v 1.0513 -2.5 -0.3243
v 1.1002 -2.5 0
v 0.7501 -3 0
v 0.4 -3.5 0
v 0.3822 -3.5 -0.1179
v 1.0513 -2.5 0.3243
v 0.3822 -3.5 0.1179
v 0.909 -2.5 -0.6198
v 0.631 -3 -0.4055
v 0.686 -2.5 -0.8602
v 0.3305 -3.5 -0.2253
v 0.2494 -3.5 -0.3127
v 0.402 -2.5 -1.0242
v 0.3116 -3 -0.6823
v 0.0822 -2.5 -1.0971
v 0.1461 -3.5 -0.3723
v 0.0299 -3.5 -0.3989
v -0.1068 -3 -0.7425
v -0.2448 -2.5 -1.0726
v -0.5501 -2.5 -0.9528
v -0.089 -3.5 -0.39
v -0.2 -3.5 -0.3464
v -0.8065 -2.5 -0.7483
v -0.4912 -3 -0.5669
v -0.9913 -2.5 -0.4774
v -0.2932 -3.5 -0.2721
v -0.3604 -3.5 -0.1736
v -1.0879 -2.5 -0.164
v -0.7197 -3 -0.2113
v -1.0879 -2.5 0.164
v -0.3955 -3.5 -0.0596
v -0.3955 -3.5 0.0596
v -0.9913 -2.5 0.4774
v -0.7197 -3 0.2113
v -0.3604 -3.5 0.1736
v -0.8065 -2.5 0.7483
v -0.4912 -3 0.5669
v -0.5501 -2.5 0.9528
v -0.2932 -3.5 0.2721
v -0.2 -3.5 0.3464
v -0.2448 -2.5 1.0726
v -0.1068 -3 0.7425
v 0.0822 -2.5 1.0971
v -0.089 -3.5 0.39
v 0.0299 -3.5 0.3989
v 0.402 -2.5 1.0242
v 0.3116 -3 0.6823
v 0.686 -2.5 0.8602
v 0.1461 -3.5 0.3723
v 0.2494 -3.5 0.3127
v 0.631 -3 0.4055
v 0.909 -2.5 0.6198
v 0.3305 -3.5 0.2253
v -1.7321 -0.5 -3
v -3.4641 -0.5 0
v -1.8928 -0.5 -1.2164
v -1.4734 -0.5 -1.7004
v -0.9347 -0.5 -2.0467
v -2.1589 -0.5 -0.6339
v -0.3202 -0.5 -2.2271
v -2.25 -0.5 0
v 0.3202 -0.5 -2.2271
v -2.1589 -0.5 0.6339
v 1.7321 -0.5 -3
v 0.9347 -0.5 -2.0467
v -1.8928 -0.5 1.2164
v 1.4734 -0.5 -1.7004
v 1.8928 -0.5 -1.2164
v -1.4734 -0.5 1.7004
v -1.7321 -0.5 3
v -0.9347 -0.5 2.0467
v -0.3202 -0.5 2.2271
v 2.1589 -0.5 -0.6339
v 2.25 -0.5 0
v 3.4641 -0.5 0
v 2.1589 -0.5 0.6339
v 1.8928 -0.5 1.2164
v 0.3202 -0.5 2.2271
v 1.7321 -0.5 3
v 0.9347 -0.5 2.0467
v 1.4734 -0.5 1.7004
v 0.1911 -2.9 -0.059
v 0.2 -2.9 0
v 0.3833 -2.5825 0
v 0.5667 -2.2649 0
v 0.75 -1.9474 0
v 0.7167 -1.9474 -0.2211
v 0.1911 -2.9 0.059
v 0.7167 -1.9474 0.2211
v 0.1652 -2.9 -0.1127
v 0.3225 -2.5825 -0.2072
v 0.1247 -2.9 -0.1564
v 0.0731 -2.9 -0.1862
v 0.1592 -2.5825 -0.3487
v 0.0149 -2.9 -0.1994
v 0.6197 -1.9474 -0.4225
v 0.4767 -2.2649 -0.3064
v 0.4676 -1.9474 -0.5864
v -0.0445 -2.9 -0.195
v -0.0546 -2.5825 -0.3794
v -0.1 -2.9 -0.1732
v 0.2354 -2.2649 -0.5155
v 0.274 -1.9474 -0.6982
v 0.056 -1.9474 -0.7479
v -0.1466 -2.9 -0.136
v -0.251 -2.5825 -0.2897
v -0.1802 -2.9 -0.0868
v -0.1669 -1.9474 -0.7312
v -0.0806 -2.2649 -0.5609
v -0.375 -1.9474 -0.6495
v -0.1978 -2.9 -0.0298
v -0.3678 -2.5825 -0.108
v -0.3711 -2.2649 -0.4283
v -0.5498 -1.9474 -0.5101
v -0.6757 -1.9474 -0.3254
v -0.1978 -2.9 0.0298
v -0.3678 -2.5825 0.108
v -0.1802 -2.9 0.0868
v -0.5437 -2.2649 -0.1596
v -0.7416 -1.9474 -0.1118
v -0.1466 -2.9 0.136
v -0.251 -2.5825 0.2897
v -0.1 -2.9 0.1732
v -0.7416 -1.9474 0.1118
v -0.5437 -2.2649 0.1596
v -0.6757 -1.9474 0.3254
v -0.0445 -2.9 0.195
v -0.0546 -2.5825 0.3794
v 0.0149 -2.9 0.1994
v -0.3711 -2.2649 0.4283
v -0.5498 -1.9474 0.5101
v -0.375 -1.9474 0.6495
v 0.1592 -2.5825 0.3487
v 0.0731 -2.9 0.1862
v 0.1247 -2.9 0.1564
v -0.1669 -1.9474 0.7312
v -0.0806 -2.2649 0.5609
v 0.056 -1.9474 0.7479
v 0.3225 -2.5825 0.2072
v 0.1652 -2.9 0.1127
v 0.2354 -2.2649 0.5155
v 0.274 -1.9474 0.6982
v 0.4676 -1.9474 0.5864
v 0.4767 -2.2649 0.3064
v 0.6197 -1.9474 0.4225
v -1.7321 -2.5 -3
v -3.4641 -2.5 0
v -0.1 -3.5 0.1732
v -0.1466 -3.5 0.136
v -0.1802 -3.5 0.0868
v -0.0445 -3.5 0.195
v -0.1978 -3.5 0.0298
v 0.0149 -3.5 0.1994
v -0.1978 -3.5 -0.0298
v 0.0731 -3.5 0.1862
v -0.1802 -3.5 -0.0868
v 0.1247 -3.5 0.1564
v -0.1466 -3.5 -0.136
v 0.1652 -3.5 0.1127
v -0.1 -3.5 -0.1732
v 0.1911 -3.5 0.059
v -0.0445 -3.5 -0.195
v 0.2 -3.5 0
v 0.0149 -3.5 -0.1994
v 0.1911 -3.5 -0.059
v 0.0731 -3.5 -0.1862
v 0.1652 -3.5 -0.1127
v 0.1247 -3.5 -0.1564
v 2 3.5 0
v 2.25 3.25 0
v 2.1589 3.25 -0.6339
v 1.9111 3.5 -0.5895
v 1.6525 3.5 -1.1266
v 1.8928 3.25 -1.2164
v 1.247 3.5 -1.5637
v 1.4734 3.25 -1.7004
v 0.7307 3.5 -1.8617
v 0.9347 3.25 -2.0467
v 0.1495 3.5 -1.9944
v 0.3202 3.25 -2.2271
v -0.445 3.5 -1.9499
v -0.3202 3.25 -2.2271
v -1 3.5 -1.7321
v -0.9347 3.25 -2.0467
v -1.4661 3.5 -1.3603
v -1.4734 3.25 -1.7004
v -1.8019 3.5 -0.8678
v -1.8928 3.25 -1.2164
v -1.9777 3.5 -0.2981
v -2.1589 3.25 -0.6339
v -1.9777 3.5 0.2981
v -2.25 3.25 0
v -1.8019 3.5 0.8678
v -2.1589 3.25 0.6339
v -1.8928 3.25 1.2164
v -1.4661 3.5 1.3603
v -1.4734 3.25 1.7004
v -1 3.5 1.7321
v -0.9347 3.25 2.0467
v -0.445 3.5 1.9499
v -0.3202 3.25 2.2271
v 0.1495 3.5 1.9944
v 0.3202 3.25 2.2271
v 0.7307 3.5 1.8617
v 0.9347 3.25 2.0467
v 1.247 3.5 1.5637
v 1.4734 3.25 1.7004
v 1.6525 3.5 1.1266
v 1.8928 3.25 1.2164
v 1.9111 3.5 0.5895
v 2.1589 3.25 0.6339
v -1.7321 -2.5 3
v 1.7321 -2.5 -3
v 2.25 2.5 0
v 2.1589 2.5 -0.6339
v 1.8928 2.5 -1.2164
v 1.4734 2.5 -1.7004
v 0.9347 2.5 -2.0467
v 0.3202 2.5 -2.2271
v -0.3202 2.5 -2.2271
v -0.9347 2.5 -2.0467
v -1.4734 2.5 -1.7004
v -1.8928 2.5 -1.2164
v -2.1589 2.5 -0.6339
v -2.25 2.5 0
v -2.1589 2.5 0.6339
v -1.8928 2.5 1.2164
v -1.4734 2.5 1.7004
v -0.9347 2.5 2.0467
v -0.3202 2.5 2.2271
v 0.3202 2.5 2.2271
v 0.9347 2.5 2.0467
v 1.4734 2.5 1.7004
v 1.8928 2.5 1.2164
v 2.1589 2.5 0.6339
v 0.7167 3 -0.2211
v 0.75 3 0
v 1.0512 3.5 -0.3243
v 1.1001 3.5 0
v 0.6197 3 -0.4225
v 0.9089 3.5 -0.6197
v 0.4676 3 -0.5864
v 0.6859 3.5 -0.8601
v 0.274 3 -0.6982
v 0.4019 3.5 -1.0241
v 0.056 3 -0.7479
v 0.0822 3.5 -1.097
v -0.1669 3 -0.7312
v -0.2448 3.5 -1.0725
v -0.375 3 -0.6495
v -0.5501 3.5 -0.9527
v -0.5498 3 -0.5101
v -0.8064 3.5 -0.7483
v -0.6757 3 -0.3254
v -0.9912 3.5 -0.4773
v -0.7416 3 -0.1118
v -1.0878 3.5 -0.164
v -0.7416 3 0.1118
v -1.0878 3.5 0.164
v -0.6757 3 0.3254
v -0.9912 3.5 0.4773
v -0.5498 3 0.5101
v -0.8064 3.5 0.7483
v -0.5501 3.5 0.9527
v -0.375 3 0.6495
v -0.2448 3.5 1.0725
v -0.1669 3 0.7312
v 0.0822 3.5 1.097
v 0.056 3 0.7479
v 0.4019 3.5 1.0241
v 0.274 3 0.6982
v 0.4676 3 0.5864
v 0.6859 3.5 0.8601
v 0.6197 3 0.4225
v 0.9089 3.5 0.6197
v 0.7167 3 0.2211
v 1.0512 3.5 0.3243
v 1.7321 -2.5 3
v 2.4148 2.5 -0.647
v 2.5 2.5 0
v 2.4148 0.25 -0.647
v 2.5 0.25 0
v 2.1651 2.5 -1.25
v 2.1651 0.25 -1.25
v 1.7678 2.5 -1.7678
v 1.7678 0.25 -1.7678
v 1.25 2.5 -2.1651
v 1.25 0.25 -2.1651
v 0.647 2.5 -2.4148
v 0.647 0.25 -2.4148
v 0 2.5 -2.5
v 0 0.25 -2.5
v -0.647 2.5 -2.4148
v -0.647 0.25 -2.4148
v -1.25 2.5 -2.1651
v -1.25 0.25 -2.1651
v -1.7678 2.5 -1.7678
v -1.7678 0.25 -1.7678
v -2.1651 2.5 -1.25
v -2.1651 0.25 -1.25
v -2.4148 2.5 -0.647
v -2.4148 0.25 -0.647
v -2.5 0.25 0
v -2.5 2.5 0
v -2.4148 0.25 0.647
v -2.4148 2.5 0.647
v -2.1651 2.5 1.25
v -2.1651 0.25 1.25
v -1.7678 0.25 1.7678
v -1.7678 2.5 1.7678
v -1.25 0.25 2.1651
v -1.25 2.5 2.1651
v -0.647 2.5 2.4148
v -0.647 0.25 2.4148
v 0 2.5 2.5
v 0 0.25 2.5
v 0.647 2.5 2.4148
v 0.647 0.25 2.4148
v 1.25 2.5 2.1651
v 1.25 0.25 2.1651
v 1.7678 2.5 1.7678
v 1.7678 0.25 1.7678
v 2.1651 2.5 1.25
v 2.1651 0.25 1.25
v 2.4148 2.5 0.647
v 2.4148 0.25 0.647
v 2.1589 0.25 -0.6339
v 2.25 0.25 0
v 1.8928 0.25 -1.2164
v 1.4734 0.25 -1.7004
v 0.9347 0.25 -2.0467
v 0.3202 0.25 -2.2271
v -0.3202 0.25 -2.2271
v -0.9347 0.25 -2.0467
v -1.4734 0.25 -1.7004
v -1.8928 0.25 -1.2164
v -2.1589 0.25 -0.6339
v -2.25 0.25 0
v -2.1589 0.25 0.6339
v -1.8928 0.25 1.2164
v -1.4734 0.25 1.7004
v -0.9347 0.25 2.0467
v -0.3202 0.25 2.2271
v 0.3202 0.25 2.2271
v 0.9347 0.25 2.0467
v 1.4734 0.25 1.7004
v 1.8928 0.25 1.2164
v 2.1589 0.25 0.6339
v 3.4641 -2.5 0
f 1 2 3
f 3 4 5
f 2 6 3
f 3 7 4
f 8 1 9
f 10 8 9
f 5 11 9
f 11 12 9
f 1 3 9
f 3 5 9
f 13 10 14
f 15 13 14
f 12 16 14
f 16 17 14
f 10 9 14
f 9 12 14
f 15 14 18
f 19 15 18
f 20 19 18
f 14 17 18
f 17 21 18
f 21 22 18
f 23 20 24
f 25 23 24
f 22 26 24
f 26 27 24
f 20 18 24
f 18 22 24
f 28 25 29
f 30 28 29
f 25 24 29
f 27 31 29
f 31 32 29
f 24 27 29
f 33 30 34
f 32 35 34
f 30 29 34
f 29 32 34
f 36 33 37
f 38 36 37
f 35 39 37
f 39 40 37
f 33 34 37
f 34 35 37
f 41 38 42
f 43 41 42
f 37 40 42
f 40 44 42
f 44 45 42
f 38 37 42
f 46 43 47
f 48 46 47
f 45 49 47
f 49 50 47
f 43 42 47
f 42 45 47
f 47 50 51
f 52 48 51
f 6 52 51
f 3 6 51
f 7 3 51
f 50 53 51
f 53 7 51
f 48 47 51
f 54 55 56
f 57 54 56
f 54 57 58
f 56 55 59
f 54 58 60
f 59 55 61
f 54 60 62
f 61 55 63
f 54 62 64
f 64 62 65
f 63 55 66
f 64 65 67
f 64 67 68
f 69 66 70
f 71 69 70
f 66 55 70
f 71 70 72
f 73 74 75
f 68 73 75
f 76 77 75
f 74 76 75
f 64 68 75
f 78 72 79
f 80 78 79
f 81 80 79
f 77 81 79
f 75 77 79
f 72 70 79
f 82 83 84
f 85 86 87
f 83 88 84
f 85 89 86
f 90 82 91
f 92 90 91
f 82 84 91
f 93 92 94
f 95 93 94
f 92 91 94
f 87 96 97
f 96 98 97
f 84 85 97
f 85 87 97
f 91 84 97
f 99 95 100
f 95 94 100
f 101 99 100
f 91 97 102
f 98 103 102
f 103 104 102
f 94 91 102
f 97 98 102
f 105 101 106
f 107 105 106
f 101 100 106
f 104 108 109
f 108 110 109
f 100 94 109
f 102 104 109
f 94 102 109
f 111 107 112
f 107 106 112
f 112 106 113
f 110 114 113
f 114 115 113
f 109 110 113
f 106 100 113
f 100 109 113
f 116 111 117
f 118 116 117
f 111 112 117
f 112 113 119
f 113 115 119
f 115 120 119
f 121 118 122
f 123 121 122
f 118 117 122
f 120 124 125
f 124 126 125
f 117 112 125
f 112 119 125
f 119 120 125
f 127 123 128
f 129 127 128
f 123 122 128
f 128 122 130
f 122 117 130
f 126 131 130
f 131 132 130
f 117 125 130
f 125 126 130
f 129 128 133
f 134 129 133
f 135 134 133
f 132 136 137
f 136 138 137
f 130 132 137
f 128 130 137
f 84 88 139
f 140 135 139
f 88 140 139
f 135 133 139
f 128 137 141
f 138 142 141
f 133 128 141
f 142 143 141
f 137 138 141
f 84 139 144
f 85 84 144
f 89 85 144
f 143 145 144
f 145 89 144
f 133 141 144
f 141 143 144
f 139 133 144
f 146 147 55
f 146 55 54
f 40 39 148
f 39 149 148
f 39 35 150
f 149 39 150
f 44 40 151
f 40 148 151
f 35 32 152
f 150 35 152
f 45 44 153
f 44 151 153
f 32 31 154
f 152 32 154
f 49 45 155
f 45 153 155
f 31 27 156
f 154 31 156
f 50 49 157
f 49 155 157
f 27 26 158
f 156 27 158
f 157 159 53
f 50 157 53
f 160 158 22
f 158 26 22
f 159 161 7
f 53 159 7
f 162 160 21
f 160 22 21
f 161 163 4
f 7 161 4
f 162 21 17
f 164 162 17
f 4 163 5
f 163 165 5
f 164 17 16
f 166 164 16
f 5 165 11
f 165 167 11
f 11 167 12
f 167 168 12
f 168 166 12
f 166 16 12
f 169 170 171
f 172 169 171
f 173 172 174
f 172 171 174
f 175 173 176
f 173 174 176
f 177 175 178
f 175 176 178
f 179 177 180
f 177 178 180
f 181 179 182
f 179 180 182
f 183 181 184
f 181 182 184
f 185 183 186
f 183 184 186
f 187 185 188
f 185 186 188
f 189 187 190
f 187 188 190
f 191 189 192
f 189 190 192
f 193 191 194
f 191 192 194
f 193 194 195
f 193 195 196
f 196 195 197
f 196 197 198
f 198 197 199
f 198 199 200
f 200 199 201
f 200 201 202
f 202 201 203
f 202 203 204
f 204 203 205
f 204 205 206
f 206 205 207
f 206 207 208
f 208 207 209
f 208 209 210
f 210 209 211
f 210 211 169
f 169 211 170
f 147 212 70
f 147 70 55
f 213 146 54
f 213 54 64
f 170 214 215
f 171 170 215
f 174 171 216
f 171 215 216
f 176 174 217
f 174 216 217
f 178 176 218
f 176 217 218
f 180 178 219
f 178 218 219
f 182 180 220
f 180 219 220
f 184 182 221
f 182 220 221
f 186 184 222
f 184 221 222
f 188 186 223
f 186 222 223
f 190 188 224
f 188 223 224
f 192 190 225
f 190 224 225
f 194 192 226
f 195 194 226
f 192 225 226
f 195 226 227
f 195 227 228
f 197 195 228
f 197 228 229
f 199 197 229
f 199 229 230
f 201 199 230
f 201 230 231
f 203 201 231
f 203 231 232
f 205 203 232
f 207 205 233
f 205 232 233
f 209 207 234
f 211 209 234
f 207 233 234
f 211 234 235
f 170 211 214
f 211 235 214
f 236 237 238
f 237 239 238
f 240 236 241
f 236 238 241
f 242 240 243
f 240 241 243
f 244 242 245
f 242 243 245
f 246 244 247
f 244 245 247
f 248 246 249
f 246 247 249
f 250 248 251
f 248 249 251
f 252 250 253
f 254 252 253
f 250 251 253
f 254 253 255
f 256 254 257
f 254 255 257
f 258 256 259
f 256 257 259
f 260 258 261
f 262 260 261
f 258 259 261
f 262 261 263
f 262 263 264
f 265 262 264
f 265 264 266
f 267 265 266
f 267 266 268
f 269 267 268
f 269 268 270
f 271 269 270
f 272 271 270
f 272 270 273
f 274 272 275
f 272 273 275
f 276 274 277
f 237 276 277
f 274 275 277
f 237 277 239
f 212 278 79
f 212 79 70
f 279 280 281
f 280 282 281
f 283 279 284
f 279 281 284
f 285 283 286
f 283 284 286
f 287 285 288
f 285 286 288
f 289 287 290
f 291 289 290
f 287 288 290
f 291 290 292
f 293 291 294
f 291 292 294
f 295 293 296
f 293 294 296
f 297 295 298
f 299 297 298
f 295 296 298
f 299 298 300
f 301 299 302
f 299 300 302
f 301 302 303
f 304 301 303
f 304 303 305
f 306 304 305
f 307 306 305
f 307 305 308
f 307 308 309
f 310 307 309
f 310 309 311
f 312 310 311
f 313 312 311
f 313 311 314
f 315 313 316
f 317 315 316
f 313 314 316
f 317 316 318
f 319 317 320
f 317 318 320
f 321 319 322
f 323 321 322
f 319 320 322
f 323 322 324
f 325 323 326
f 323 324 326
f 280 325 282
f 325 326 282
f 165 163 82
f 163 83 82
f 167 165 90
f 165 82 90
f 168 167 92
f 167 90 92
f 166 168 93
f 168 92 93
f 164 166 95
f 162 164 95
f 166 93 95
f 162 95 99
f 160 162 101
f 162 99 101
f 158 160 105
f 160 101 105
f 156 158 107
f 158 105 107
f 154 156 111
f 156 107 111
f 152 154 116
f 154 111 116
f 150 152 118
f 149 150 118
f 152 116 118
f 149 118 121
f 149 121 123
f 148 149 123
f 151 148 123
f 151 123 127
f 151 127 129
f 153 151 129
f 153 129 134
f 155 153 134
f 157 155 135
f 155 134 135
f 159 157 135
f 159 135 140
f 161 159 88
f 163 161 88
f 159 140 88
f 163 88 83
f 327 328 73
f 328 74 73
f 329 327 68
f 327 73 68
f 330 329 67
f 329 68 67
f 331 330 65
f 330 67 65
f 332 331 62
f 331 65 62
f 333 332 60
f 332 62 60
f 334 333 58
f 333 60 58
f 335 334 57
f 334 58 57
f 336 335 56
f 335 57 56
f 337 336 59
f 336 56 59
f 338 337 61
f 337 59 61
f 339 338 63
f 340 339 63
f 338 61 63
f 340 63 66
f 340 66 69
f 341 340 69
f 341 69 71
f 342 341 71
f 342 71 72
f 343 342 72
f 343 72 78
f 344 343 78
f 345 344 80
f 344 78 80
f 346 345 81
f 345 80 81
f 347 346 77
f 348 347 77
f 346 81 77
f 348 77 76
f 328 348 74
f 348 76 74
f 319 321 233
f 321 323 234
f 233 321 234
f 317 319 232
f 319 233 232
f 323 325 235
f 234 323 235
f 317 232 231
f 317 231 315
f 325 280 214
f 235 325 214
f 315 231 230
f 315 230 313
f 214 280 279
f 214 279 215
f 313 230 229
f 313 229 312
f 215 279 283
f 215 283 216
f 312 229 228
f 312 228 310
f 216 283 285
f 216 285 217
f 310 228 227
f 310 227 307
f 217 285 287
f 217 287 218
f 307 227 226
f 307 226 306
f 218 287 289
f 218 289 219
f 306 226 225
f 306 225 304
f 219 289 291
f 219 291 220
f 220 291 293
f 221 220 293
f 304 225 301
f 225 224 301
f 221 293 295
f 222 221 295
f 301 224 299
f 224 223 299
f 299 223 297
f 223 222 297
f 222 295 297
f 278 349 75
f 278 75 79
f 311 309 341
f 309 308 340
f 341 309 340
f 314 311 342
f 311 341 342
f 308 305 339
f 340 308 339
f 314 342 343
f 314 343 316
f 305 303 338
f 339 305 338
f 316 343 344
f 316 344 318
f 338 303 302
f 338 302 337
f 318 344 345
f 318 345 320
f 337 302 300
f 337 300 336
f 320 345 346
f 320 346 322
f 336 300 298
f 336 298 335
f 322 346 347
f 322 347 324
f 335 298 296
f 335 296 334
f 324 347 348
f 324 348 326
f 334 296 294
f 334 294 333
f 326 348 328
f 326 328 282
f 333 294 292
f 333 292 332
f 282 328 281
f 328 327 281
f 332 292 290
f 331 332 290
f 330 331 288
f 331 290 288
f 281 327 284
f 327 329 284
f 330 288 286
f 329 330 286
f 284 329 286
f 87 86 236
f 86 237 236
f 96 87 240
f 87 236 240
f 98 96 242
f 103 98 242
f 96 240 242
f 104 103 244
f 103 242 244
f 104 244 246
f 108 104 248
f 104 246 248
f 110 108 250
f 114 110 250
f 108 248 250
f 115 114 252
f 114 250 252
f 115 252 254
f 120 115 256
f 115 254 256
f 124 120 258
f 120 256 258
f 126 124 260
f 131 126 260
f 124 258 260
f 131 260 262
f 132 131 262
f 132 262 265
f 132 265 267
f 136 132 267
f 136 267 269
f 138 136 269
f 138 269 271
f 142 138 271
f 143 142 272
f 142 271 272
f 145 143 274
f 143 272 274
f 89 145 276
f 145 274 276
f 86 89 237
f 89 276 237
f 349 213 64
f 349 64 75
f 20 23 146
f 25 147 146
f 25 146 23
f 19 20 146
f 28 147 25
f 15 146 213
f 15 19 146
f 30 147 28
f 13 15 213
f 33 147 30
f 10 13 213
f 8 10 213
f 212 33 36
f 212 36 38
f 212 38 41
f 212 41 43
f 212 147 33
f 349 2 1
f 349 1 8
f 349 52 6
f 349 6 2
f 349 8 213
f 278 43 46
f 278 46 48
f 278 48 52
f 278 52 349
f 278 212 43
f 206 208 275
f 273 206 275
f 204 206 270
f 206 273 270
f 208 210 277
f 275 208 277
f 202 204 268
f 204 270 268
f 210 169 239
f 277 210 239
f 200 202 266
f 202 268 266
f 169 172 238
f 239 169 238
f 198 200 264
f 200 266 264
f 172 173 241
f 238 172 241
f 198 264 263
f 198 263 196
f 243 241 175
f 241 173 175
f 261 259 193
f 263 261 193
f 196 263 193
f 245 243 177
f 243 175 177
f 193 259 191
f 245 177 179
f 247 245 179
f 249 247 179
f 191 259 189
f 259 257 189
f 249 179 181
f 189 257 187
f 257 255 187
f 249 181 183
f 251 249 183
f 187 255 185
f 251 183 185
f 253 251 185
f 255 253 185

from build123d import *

# Parameters (mm, degrees)
SKETCH2_R           = 2.612661588
BOSS_EXTRUDE1_DEPTH = 2
CHAMFER1_SIZE       = 0.25


with BuildPart() as part:
    # Sketch1 → Revolve1 (revolve)
    with BuildSketch(Plane.XY):
        Polygon((0.2, -3.5), (0.2, -2.9), (0.75, -1.947372056), (0.75, 3), (1.100103769, 3.5), (2.25, 3.5), (2.25, 2.5), (2.5, 2.5), (2.5, 0.25), (2.25, 0.25), (2.25, -0.5), (3, -0.5), (3, -2.5), (1.100207538, -2.5), (0.4, -3.5), align=None)
    revolve(axis=Axis((0, -3.5, 0), (0, 1, 0)))

    # Sketch2 → Boss-Extrude1 (add)
    with BuildSketch(Plane.XZ.offset(2.5)):
        Polygon((1.732050808, 3), (-1.732050808, 3), (-3.464101615, 0), (-1.732050808, -3), (1.732050808, -3), (3.464101615, 0), align=None)
        Circle(SKETCH2_R, mode=Mode.SUBTRACT)
    extrude(amount=-BOSS_EXTRUDE1_DEPTH)

    # Chamfer1
    chamfer1_edges = [part.edges().sort_by_distance(p)[0] for p in [
        (-2.25, 3.5, 0),
    ]]
    chamfer(chamfer1_edges, length=CHAMFER1_SIZE)


solid = part.part
